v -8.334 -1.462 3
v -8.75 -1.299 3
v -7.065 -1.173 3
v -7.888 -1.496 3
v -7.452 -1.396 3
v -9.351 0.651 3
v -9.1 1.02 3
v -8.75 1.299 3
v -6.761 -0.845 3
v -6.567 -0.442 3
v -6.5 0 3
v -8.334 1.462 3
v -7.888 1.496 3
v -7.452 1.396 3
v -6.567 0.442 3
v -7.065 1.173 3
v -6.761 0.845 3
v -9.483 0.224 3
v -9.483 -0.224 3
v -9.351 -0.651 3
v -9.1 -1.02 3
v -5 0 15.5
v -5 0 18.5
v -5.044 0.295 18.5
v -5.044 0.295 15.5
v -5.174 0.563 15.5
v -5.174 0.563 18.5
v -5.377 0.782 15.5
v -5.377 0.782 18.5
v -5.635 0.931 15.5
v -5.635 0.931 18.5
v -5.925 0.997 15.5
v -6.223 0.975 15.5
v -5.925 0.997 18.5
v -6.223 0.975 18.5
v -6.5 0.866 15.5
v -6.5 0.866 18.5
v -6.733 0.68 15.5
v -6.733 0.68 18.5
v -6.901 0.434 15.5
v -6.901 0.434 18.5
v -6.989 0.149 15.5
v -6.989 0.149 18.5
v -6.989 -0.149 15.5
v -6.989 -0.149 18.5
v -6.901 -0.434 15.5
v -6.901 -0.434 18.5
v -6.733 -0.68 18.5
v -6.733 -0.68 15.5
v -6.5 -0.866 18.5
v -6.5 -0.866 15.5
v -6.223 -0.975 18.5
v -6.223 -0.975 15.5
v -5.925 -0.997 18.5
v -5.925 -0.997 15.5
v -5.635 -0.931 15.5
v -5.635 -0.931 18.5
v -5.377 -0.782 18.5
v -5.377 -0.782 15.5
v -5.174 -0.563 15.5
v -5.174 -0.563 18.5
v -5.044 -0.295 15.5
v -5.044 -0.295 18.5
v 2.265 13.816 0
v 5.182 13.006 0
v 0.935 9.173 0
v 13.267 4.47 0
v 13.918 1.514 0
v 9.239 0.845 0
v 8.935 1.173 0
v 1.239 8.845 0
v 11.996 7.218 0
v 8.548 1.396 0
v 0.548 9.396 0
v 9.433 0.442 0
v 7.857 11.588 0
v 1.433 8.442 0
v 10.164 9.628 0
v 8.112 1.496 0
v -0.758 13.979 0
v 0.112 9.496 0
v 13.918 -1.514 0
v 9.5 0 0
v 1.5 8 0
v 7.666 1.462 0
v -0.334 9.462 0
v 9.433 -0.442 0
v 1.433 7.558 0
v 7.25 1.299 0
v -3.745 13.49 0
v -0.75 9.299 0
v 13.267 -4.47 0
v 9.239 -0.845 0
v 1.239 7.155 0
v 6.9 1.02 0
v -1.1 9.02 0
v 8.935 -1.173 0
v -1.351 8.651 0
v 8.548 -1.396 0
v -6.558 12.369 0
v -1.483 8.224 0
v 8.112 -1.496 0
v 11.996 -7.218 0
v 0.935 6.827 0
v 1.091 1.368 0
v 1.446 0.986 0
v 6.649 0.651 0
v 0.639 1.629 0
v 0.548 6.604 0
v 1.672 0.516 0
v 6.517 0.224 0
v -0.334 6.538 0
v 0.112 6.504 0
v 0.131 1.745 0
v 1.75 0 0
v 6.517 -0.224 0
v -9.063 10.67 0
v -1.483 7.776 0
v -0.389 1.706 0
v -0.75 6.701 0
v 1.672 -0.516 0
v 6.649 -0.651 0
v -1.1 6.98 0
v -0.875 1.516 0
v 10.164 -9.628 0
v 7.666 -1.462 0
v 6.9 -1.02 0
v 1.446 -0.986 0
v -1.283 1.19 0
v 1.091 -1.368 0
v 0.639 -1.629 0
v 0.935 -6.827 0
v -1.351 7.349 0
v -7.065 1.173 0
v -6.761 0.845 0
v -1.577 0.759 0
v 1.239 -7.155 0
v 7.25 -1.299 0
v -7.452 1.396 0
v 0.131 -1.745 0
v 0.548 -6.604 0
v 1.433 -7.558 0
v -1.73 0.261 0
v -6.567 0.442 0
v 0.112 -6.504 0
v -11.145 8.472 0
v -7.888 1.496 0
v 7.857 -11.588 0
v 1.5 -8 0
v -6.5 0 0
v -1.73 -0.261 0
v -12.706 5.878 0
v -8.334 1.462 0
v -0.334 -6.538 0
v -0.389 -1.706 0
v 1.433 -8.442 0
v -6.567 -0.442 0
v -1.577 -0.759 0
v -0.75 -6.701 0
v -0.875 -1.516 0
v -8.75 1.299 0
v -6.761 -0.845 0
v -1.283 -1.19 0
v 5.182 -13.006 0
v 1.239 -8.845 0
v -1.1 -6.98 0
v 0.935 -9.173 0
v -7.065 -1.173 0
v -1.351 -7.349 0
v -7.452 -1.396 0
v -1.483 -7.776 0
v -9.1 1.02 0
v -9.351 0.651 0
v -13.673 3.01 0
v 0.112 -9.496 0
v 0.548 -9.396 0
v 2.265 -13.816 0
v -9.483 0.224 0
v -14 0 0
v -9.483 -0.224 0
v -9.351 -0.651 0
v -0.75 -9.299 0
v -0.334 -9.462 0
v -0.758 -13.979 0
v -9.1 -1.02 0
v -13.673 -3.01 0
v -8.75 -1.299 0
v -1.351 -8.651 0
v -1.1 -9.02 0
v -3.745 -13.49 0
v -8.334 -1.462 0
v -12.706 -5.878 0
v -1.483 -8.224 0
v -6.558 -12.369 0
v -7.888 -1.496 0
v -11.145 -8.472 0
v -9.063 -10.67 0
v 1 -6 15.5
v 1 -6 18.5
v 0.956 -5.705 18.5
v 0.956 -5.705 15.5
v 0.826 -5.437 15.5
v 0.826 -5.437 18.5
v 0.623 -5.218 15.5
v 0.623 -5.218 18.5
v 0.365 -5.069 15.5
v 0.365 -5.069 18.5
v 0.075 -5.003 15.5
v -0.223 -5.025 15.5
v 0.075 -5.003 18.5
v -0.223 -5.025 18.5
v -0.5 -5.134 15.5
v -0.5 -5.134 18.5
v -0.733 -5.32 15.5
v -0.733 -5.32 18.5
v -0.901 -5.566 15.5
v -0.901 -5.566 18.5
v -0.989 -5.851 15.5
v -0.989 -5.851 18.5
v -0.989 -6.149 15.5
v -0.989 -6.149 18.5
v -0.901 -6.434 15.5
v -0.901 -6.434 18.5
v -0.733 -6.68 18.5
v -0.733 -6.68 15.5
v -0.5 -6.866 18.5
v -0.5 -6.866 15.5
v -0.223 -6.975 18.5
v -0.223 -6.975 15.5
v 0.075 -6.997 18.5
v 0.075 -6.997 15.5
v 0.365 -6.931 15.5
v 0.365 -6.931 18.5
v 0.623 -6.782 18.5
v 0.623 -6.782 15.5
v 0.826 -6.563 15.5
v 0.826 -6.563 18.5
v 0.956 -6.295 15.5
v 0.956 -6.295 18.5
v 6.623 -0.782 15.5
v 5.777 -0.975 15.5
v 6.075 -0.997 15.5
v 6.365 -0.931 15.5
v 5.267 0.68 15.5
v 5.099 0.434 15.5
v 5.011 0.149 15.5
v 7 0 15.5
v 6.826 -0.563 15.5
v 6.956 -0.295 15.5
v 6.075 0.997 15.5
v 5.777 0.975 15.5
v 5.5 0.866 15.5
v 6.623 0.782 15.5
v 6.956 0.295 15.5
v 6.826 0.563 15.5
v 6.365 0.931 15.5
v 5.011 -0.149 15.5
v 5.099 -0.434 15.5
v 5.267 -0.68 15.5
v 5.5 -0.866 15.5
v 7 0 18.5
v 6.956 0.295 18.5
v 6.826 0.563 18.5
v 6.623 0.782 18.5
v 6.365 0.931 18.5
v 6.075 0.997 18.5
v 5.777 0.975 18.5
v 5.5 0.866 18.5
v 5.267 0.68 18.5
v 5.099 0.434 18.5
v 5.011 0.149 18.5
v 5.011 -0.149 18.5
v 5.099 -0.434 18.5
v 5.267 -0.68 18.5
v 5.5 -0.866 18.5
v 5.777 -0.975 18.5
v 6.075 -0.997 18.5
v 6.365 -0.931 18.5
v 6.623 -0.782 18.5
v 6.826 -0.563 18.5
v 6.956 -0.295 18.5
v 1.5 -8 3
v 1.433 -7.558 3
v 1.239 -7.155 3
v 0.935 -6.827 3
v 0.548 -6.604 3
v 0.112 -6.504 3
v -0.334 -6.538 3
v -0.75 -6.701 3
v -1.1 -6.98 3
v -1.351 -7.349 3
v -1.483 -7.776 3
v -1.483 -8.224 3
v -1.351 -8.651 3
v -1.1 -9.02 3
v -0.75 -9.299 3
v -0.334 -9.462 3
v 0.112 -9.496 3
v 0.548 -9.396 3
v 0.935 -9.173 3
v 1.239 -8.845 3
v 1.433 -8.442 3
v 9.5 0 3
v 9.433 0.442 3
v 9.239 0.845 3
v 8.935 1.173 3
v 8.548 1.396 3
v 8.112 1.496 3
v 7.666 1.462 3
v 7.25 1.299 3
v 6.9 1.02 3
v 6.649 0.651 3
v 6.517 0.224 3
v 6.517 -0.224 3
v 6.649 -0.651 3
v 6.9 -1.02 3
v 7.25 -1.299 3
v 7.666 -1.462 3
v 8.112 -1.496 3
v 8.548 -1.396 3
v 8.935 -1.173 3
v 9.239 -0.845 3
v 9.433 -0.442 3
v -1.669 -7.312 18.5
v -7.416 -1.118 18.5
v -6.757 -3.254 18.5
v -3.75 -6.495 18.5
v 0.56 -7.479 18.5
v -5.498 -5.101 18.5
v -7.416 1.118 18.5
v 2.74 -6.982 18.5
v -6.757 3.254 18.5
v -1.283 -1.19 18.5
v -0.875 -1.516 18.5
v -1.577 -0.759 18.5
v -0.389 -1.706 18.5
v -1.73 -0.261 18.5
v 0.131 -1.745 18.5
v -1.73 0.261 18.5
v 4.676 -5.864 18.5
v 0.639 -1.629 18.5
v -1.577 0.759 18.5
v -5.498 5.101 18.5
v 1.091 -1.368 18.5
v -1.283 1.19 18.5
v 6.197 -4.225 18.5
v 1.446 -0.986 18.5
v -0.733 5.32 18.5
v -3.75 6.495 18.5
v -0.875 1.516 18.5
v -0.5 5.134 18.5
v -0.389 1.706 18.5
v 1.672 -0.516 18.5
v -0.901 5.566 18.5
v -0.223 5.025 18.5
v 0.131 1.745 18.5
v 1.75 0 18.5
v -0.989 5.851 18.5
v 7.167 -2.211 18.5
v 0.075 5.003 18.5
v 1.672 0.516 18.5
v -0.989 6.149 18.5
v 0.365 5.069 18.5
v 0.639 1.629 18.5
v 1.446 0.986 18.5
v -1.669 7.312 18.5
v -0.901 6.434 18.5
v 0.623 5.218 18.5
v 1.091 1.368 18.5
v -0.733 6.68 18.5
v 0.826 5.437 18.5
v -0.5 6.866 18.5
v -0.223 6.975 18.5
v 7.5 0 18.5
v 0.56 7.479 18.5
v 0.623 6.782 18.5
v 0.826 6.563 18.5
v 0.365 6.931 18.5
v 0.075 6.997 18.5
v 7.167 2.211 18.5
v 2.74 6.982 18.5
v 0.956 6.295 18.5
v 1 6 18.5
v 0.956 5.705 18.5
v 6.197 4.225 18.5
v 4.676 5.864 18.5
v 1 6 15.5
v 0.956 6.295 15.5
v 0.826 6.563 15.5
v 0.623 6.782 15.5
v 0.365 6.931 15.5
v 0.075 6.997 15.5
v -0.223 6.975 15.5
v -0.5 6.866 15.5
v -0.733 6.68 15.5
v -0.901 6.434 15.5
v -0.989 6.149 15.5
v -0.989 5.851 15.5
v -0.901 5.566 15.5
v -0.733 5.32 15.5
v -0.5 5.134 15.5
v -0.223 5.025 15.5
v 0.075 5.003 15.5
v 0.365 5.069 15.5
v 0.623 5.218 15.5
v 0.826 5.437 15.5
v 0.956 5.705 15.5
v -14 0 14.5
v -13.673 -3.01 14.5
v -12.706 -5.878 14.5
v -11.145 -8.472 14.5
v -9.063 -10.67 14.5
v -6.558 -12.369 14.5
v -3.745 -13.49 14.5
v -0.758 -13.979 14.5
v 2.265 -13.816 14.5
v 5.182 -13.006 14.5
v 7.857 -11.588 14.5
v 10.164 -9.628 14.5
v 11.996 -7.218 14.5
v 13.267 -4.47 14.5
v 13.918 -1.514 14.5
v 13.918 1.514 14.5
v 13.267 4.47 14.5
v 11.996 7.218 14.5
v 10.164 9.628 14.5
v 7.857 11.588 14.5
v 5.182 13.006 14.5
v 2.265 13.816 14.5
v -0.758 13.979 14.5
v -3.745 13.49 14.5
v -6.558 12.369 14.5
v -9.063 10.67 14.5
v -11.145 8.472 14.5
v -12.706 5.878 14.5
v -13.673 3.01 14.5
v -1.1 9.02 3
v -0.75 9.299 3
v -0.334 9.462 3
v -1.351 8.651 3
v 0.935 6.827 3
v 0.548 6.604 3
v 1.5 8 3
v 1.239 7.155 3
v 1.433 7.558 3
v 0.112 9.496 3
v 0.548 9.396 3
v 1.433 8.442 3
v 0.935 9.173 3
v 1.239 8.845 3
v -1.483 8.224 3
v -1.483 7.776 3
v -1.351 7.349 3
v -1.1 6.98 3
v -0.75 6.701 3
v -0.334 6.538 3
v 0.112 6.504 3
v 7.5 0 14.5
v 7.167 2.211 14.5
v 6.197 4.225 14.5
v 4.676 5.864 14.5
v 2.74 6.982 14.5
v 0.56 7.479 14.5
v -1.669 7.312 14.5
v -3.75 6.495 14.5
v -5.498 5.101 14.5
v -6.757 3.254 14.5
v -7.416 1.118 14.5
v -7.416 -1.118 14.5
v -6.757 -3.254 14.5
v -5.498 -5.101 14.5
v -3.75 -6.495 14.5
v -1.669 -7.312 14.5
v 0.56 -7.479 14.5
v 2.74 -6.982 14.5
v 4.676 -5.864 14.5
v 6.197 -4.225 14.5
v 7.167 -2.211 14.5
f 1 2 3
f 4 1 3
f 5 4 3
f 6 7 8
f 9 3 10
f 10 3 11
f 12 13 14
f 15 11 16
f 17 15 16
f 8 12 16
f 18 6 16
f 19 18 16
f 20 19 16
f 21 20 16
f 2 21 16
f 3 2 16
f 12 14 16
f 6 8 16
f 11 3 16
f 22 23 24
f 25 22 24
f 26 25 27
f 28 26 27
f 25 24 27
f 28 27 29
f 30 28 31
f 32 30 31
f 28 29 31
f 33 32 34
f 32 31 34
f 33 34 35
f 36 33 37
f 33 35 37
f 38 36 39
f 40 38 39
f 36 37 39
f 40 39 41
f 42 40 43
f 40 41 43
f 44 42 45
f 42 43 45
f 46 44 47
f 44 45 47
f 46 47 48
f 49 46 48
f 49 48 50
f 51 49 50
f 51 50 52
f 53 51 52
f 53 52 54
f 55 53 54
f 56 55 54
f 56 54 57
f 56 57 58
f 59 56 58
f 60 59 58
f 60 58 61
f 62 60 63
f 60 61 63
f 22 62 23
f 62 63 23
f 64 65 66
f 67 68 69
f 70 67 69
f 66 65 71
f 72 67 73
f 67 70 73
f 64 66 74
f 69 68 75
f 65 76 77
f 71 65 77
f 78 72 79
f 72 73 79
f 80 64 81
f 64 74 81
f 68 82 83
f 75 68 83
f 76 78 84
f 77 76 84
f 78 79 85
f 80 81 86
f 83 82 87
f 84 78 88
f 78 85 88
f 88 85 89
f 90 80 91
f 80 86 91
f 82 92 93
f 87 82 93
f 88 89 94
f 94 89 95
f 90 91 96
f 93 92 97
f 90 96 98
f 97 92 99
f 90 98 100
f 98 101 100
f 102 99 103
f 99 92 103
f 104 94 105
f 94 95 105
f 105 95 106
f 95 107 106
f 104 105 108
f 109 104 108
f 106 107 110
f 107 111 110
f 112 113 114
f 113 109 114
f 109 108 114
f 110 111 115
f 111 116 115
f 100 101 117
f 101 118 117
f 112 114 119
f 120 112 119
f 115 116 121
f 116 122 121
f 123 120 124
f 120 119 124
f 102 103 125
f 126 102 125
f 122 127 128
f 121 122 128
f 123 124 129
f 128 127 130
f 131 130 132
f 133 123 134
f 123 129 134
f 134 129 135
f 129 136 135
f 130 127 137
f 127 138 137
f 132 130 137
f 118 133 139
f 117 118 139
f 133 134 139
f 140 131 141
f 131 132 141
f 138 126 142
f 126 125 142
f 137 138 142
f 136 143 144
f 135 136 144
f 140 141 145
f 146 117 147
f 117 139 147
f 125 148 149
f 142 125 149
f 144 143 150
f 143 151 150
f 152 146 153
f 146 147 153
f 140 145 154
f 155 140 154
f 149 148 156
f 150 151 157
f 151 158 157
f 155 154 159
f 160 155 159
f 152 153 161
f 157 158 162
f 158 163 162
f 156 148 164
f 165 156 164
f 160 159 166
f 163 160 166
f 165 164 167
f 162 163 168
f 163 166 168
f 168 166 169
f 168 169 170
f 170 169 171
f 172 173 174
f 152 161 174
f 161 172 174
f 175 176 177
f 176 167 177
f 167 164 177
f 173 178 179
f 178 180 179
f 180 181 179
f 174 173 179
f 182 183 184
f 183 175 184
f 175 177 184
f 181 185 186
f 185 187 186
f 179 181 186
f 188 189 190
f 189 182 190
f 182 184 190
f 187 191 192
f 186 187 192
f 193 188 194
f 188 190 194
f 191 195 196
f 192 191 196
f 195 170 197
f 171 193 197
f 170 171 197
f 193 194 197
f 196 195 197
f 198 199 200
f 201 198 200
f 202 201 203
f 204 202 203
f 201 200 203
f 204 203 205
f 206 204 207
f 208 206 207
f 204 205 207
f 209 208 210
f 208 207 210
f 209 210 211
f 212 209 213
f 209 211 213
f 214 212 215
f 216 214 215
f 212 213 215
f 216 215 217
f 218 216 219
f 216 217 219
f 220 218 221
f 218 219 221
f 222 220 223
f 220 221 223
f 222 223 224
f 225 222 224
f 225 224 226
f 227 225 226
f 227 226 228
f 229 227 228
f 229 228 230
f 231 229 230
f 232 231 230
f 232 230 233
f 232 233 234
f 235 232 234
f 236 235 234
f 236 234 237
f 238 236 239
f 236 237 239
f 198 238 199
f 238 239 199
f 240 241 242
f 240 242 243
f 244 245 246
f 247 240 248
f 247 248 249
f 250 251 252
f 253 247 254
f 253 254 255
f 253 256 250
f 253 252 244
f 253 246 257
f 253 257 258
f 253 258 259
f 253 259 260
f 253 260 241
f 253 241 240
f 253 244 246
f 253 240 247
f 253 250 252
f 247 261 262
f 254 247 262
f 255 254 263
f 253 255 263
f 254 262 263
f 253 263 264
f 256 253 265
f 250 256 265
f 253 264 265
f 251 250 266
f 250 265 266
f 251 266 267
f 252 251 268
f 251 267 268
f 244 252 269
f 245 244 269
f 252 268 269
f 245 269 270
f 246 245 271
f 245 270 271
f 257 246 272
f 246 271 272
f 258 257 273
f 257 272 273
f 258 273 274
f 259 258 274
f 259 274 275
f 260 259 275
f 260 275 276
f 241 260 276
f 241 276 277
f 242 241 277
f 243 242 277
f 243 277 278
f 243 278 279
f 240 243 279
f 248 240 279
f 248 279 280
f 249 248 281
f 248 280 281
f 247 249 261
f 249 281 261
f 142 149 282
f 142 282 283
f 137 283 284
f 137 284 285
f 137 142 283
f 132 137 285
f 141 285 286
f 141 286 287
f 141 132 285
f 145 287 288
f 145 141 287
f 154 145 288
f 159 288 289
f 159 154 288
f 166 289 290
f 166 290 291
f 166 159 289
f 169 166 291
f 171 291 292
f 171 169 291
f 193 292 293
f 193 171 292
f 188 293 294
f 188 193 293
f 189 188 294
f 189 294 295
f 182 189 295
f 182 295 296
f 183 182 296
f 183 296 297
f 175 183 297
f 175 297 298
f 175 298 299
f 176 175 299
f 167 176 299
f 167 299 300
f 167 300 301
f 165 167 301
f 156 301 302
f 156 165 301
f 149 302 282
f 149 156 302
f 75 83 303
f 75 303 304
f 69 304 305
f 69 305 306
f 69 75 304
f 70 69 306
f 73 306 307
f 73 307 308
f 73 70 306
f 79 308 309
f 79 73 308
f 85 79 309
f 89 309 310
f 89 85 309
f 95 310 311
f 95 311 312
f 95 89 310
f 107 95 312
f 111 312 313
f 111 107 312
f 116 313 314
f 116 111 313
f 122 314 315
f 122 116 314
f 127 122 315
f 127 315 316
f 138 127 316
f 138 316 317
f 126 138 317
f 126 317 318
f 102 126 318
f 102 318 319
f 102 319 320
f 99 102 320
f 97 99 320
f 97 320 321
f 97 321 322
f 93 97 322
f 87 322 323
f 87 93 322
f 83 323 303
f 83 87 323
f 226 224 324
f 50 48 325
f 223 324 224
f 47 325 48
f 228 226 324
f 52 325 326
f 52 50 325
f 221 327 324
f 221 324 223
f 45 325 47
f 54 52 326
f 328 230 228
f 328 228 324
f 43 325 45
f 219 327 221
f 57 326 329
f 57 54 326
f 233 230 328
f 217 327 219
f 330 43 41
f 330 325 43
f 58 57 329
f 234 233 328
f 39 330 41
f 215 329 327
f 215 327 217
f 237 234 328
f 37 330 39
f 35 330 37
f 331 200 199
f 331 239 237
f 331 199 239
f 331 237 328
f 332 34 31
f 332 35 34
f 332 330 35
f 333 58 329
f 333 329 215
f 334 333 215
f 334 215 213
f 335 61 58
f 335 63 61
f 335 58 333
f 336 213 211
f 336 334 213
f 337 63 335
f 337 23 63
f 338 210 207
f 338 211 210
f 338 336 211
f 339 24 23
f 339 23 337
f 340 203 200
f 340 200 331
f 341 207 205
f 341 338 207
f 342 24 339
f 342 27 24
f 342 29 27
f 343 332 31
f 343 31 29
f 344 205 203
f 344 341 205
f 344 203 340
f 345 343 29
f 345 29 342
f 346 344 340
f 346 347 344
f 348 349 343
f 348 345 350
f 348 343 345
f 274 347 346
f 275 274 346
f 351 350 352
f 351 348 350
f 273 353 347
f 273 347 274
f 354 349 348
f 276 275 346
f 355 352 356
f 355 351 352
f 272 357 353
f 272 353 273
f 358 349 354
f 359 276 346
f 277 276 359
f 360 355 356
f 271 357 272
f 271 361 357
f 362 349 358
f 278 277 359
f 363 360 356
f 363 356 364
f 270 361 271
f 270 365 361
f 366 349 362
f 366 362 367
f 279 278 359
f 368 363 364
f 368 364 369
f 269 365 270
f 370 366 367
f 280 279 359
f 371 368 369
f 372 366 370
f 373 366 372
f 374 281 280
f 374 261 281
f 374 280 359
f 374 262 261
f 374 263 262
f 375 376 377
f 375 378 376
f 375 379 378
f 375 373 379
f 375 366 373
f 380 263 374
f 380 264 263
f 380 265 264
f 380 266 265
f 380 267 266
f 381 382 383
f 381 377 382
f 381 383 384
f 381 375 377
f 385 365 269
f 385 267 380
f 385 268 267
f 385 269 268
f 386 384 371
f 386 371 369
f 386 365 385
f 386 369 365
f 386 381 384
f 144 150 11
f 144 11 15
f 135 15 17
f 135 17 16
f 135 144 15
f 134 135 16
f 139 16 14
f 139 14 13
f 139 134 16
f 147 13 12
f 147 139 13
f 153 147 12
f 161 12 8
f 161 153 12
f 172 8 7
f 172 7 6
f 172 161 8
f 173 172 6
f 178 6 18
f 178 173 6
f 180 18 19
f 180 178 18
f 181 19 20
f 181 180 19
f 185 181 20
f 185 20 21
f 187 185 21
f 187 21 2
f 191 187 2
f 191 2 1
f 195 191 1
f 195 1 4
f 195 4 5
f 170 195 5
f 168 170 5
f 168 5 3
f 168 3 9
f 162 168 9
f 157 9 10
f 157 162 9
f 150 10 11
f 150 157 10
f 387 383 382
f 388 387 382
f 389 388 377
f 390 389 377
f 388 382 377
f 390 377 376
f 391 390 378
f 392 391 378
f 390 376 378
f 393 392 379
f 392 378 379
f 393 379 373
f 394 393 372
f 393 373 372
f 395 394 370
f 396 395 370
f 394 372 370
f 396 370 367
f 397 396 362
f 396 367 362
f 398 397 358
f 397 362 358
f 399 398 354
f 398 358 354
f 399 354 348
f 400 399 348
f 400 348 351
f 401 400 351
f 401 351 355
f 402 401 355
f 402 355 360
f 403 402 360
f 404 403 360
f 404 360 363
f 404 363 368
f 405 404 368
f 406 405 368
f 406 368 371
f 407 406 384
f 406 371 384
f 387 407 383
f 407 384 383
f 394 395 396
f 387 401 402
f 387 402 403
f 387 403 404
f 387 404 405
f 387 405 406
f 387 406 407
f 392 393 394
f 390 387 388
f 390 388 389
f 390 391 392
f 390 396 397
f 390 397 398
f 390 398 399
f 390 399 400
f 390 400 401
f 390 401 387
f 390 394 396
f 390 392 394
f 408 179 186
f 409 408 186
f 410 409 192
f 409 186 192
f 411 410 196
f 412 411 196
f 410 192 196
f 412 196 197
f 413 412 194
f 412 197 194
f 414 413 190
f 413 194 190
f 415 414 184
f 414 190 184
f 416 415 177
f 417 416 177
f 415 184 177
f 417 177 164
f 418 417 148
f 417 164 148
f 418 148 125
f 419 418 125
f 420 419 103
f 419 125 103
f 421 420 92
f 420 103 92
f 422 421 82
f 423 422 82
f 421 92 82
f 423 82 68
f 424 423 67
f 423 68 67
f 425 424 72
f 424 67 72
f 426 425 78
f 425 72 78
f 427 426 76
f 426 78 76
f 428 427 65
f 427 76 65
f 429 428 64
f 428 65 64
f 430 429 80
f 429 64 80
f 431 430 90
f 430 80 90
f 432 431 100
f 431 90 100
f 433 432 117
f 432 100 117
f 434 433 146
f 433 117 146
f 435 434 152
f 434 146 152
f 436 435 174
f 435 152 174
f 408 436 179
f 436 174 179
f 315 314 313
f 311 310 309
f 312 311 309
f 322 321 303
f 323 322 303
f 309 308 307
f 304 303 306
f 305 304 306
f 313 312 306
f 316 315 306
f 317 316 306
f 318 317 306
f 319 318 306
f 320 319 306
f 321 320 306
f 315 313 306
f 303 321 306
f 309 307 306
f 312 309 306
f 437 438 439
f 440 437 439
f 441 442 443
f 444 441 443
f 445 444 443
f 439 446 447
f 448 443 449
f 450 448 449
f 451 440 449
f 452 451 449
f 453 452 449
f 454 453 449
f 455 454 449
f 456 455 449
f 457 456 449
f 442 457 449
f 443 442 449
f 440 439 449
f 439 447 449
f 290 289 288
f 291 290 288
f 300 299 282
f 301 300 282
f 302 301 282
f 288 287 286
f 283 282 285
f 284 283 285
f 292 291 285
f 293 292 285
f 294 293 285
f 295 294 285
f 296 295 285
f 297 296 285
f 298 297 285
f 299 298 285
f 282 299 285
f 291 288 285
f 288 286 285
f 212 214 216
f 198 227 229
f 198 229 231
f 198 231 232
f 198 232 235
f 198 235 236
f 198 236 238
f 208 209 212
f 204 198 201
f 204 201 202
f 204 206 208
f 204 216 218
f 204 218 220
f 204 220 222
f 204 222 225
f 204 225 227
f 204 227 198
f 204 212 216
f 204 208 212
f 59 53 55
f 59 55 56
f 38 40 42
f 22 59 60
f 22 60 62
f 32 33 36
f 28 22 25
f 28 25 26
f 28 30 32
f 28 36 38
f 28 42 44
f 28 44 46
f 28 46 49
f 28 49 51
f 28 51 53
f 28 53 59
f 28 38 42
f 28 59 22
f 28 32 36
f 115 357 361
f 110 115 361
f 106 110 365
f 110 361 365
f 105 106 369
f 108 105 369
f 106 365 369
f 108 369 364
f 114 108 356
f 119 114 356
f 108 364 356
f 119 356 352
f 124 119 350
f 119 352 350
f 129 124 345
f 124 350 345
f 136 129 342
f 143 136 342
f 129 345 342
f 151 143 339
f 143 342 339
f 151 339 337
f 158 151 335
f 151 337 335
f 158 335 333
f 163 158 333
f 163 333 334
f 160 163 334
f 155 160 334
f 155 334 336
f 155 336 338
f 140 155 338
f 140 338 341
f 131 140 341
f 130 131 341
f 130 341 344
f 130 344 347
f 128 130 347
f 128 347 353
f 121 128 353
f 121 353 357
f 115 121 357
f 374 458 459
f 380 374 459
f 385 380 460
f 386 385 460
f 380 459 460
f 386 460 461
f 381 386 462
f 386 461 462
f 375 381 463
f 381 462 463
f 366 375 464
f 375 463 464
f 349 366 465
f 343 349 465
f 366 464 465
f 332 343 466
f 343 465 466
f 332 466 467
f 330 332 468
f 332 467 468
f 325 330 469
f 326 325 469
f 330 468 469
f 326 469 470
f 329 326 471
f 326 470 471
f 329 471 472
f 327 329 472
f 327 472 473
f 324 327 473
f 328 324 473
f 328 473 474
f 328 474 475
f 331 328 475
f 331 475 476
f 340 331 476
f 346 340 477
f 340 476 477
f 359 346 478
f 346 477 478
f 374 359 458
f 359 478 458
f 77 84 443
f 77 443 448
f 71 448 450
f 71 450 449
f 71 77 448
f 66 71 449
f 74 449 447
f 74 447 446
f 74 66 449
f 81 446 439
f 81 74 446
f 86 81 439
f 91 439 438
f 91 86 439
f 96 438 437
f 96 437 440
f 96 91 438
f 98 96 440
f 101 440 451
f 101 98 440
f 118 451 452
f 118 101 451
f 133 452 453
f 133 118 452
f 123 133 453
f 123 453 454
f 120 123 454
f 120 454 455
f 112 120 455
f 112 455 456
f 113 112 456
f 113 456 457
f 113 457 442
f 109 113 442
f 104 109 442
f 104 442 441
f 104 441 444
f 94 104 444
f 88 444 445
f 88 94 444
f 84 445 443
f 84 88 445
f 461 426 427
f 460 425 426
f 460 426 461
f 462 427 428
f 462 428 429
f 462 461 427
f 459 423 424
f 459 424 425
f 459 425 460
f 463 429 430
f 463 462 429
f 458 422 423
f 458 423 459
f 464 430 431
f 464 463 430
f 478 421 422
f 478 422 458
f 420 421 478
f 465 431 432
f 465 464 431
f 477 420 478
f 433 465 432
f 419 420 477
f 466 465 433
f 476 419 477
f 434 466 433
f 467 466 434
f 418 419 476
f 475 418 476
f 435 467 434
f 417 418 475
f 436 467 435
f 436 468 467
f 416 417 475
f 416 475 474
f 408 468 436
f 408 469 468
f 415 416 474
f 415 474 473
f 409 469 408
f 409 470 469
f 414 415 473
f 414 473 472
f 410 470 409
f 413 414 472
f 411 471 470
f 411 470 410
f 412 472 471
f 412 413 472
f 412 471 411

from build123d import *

# Parameters (mm, degrees)
SKETCH_1_R          = 14
EXTRUDE_1_DEPTH     = 14.5
SKETCH_3_R          = 7.5
EXTRUDE_3_DEPTH     = 4
SKETCH_4_R          = 1.75
CUT_EXTRUDE_1_DEPTH = 28.09704781
SKETCH_5_R          = 1
CUT_EXTRUDE_2_DEPTH = 3
SKETCH_6_R          = 1.5
CUT_EXTRUDE_3_DEPTH = 3


with BuildPart() as part:
    # 草图1 → 凸台-拉伸1 (new body)
    with BuildSketch(Plane.XY):
        with Locations(Location((0, 0, 0), (0, 0, 180))):
            Circle(SKETCH_1_R)
    extrude(amount=EXTRUDE_1_DEPTH)

    # 草图3 → 凸台-拉伸3 (add)
    with BuildSketch(Plane.XY.offset(14.5)):
        Circle(SKETCH_3_R)
    extrude(amount=EXTRUDE_3_DEPTH)

    # 草图4 → 切除-拉伸1 (cut, through all)
    with BuildSketch(Plane.XY.offset(18.5)):
        Circle(SKETCH_4_R)
    extrude(amount=-CUT_EXTRUDE_1_DEPTH, mode=Mode.SUBTRACT)

    # 草图5 → 切除-拉伸2 (cut)
    with BuildSketch(Plane.XY.offset(18.5)):
        with Locations((0, -6)):
            Circle(SKETCH_5_R)
        with Locations((-6, 0)):
            Circle(SKETCH_5_R)
        with Locations((0, 6)):
            Circle(SKETCH_5_R)
        with Locations((6, 0)):
            Circle(SKETCH_5_R)
    extrude(amount=-CUT_EXTRUDE_2_DEPTH, mode=Mode.SUBTRACT)

    # 草图6 → 切除-拉伸3 (cut)
    with BuildSketch(Plane.XY):
        with Locations((0, 8)):
            Circle(SKETCH_6_R)
        with Locations((-8, 0)):
            Circle(SKETCH_6_R)
        with Locations((0, -8)):
            Circle(SKETCH_6_R)
        with Locations((8, 0)):
            Circle(SKETCH_6_R)
    extrude(amount=CUT_EXTRUDE_3_DEPTH, mode=Mode.SUBTRACT)


solid = part.part
